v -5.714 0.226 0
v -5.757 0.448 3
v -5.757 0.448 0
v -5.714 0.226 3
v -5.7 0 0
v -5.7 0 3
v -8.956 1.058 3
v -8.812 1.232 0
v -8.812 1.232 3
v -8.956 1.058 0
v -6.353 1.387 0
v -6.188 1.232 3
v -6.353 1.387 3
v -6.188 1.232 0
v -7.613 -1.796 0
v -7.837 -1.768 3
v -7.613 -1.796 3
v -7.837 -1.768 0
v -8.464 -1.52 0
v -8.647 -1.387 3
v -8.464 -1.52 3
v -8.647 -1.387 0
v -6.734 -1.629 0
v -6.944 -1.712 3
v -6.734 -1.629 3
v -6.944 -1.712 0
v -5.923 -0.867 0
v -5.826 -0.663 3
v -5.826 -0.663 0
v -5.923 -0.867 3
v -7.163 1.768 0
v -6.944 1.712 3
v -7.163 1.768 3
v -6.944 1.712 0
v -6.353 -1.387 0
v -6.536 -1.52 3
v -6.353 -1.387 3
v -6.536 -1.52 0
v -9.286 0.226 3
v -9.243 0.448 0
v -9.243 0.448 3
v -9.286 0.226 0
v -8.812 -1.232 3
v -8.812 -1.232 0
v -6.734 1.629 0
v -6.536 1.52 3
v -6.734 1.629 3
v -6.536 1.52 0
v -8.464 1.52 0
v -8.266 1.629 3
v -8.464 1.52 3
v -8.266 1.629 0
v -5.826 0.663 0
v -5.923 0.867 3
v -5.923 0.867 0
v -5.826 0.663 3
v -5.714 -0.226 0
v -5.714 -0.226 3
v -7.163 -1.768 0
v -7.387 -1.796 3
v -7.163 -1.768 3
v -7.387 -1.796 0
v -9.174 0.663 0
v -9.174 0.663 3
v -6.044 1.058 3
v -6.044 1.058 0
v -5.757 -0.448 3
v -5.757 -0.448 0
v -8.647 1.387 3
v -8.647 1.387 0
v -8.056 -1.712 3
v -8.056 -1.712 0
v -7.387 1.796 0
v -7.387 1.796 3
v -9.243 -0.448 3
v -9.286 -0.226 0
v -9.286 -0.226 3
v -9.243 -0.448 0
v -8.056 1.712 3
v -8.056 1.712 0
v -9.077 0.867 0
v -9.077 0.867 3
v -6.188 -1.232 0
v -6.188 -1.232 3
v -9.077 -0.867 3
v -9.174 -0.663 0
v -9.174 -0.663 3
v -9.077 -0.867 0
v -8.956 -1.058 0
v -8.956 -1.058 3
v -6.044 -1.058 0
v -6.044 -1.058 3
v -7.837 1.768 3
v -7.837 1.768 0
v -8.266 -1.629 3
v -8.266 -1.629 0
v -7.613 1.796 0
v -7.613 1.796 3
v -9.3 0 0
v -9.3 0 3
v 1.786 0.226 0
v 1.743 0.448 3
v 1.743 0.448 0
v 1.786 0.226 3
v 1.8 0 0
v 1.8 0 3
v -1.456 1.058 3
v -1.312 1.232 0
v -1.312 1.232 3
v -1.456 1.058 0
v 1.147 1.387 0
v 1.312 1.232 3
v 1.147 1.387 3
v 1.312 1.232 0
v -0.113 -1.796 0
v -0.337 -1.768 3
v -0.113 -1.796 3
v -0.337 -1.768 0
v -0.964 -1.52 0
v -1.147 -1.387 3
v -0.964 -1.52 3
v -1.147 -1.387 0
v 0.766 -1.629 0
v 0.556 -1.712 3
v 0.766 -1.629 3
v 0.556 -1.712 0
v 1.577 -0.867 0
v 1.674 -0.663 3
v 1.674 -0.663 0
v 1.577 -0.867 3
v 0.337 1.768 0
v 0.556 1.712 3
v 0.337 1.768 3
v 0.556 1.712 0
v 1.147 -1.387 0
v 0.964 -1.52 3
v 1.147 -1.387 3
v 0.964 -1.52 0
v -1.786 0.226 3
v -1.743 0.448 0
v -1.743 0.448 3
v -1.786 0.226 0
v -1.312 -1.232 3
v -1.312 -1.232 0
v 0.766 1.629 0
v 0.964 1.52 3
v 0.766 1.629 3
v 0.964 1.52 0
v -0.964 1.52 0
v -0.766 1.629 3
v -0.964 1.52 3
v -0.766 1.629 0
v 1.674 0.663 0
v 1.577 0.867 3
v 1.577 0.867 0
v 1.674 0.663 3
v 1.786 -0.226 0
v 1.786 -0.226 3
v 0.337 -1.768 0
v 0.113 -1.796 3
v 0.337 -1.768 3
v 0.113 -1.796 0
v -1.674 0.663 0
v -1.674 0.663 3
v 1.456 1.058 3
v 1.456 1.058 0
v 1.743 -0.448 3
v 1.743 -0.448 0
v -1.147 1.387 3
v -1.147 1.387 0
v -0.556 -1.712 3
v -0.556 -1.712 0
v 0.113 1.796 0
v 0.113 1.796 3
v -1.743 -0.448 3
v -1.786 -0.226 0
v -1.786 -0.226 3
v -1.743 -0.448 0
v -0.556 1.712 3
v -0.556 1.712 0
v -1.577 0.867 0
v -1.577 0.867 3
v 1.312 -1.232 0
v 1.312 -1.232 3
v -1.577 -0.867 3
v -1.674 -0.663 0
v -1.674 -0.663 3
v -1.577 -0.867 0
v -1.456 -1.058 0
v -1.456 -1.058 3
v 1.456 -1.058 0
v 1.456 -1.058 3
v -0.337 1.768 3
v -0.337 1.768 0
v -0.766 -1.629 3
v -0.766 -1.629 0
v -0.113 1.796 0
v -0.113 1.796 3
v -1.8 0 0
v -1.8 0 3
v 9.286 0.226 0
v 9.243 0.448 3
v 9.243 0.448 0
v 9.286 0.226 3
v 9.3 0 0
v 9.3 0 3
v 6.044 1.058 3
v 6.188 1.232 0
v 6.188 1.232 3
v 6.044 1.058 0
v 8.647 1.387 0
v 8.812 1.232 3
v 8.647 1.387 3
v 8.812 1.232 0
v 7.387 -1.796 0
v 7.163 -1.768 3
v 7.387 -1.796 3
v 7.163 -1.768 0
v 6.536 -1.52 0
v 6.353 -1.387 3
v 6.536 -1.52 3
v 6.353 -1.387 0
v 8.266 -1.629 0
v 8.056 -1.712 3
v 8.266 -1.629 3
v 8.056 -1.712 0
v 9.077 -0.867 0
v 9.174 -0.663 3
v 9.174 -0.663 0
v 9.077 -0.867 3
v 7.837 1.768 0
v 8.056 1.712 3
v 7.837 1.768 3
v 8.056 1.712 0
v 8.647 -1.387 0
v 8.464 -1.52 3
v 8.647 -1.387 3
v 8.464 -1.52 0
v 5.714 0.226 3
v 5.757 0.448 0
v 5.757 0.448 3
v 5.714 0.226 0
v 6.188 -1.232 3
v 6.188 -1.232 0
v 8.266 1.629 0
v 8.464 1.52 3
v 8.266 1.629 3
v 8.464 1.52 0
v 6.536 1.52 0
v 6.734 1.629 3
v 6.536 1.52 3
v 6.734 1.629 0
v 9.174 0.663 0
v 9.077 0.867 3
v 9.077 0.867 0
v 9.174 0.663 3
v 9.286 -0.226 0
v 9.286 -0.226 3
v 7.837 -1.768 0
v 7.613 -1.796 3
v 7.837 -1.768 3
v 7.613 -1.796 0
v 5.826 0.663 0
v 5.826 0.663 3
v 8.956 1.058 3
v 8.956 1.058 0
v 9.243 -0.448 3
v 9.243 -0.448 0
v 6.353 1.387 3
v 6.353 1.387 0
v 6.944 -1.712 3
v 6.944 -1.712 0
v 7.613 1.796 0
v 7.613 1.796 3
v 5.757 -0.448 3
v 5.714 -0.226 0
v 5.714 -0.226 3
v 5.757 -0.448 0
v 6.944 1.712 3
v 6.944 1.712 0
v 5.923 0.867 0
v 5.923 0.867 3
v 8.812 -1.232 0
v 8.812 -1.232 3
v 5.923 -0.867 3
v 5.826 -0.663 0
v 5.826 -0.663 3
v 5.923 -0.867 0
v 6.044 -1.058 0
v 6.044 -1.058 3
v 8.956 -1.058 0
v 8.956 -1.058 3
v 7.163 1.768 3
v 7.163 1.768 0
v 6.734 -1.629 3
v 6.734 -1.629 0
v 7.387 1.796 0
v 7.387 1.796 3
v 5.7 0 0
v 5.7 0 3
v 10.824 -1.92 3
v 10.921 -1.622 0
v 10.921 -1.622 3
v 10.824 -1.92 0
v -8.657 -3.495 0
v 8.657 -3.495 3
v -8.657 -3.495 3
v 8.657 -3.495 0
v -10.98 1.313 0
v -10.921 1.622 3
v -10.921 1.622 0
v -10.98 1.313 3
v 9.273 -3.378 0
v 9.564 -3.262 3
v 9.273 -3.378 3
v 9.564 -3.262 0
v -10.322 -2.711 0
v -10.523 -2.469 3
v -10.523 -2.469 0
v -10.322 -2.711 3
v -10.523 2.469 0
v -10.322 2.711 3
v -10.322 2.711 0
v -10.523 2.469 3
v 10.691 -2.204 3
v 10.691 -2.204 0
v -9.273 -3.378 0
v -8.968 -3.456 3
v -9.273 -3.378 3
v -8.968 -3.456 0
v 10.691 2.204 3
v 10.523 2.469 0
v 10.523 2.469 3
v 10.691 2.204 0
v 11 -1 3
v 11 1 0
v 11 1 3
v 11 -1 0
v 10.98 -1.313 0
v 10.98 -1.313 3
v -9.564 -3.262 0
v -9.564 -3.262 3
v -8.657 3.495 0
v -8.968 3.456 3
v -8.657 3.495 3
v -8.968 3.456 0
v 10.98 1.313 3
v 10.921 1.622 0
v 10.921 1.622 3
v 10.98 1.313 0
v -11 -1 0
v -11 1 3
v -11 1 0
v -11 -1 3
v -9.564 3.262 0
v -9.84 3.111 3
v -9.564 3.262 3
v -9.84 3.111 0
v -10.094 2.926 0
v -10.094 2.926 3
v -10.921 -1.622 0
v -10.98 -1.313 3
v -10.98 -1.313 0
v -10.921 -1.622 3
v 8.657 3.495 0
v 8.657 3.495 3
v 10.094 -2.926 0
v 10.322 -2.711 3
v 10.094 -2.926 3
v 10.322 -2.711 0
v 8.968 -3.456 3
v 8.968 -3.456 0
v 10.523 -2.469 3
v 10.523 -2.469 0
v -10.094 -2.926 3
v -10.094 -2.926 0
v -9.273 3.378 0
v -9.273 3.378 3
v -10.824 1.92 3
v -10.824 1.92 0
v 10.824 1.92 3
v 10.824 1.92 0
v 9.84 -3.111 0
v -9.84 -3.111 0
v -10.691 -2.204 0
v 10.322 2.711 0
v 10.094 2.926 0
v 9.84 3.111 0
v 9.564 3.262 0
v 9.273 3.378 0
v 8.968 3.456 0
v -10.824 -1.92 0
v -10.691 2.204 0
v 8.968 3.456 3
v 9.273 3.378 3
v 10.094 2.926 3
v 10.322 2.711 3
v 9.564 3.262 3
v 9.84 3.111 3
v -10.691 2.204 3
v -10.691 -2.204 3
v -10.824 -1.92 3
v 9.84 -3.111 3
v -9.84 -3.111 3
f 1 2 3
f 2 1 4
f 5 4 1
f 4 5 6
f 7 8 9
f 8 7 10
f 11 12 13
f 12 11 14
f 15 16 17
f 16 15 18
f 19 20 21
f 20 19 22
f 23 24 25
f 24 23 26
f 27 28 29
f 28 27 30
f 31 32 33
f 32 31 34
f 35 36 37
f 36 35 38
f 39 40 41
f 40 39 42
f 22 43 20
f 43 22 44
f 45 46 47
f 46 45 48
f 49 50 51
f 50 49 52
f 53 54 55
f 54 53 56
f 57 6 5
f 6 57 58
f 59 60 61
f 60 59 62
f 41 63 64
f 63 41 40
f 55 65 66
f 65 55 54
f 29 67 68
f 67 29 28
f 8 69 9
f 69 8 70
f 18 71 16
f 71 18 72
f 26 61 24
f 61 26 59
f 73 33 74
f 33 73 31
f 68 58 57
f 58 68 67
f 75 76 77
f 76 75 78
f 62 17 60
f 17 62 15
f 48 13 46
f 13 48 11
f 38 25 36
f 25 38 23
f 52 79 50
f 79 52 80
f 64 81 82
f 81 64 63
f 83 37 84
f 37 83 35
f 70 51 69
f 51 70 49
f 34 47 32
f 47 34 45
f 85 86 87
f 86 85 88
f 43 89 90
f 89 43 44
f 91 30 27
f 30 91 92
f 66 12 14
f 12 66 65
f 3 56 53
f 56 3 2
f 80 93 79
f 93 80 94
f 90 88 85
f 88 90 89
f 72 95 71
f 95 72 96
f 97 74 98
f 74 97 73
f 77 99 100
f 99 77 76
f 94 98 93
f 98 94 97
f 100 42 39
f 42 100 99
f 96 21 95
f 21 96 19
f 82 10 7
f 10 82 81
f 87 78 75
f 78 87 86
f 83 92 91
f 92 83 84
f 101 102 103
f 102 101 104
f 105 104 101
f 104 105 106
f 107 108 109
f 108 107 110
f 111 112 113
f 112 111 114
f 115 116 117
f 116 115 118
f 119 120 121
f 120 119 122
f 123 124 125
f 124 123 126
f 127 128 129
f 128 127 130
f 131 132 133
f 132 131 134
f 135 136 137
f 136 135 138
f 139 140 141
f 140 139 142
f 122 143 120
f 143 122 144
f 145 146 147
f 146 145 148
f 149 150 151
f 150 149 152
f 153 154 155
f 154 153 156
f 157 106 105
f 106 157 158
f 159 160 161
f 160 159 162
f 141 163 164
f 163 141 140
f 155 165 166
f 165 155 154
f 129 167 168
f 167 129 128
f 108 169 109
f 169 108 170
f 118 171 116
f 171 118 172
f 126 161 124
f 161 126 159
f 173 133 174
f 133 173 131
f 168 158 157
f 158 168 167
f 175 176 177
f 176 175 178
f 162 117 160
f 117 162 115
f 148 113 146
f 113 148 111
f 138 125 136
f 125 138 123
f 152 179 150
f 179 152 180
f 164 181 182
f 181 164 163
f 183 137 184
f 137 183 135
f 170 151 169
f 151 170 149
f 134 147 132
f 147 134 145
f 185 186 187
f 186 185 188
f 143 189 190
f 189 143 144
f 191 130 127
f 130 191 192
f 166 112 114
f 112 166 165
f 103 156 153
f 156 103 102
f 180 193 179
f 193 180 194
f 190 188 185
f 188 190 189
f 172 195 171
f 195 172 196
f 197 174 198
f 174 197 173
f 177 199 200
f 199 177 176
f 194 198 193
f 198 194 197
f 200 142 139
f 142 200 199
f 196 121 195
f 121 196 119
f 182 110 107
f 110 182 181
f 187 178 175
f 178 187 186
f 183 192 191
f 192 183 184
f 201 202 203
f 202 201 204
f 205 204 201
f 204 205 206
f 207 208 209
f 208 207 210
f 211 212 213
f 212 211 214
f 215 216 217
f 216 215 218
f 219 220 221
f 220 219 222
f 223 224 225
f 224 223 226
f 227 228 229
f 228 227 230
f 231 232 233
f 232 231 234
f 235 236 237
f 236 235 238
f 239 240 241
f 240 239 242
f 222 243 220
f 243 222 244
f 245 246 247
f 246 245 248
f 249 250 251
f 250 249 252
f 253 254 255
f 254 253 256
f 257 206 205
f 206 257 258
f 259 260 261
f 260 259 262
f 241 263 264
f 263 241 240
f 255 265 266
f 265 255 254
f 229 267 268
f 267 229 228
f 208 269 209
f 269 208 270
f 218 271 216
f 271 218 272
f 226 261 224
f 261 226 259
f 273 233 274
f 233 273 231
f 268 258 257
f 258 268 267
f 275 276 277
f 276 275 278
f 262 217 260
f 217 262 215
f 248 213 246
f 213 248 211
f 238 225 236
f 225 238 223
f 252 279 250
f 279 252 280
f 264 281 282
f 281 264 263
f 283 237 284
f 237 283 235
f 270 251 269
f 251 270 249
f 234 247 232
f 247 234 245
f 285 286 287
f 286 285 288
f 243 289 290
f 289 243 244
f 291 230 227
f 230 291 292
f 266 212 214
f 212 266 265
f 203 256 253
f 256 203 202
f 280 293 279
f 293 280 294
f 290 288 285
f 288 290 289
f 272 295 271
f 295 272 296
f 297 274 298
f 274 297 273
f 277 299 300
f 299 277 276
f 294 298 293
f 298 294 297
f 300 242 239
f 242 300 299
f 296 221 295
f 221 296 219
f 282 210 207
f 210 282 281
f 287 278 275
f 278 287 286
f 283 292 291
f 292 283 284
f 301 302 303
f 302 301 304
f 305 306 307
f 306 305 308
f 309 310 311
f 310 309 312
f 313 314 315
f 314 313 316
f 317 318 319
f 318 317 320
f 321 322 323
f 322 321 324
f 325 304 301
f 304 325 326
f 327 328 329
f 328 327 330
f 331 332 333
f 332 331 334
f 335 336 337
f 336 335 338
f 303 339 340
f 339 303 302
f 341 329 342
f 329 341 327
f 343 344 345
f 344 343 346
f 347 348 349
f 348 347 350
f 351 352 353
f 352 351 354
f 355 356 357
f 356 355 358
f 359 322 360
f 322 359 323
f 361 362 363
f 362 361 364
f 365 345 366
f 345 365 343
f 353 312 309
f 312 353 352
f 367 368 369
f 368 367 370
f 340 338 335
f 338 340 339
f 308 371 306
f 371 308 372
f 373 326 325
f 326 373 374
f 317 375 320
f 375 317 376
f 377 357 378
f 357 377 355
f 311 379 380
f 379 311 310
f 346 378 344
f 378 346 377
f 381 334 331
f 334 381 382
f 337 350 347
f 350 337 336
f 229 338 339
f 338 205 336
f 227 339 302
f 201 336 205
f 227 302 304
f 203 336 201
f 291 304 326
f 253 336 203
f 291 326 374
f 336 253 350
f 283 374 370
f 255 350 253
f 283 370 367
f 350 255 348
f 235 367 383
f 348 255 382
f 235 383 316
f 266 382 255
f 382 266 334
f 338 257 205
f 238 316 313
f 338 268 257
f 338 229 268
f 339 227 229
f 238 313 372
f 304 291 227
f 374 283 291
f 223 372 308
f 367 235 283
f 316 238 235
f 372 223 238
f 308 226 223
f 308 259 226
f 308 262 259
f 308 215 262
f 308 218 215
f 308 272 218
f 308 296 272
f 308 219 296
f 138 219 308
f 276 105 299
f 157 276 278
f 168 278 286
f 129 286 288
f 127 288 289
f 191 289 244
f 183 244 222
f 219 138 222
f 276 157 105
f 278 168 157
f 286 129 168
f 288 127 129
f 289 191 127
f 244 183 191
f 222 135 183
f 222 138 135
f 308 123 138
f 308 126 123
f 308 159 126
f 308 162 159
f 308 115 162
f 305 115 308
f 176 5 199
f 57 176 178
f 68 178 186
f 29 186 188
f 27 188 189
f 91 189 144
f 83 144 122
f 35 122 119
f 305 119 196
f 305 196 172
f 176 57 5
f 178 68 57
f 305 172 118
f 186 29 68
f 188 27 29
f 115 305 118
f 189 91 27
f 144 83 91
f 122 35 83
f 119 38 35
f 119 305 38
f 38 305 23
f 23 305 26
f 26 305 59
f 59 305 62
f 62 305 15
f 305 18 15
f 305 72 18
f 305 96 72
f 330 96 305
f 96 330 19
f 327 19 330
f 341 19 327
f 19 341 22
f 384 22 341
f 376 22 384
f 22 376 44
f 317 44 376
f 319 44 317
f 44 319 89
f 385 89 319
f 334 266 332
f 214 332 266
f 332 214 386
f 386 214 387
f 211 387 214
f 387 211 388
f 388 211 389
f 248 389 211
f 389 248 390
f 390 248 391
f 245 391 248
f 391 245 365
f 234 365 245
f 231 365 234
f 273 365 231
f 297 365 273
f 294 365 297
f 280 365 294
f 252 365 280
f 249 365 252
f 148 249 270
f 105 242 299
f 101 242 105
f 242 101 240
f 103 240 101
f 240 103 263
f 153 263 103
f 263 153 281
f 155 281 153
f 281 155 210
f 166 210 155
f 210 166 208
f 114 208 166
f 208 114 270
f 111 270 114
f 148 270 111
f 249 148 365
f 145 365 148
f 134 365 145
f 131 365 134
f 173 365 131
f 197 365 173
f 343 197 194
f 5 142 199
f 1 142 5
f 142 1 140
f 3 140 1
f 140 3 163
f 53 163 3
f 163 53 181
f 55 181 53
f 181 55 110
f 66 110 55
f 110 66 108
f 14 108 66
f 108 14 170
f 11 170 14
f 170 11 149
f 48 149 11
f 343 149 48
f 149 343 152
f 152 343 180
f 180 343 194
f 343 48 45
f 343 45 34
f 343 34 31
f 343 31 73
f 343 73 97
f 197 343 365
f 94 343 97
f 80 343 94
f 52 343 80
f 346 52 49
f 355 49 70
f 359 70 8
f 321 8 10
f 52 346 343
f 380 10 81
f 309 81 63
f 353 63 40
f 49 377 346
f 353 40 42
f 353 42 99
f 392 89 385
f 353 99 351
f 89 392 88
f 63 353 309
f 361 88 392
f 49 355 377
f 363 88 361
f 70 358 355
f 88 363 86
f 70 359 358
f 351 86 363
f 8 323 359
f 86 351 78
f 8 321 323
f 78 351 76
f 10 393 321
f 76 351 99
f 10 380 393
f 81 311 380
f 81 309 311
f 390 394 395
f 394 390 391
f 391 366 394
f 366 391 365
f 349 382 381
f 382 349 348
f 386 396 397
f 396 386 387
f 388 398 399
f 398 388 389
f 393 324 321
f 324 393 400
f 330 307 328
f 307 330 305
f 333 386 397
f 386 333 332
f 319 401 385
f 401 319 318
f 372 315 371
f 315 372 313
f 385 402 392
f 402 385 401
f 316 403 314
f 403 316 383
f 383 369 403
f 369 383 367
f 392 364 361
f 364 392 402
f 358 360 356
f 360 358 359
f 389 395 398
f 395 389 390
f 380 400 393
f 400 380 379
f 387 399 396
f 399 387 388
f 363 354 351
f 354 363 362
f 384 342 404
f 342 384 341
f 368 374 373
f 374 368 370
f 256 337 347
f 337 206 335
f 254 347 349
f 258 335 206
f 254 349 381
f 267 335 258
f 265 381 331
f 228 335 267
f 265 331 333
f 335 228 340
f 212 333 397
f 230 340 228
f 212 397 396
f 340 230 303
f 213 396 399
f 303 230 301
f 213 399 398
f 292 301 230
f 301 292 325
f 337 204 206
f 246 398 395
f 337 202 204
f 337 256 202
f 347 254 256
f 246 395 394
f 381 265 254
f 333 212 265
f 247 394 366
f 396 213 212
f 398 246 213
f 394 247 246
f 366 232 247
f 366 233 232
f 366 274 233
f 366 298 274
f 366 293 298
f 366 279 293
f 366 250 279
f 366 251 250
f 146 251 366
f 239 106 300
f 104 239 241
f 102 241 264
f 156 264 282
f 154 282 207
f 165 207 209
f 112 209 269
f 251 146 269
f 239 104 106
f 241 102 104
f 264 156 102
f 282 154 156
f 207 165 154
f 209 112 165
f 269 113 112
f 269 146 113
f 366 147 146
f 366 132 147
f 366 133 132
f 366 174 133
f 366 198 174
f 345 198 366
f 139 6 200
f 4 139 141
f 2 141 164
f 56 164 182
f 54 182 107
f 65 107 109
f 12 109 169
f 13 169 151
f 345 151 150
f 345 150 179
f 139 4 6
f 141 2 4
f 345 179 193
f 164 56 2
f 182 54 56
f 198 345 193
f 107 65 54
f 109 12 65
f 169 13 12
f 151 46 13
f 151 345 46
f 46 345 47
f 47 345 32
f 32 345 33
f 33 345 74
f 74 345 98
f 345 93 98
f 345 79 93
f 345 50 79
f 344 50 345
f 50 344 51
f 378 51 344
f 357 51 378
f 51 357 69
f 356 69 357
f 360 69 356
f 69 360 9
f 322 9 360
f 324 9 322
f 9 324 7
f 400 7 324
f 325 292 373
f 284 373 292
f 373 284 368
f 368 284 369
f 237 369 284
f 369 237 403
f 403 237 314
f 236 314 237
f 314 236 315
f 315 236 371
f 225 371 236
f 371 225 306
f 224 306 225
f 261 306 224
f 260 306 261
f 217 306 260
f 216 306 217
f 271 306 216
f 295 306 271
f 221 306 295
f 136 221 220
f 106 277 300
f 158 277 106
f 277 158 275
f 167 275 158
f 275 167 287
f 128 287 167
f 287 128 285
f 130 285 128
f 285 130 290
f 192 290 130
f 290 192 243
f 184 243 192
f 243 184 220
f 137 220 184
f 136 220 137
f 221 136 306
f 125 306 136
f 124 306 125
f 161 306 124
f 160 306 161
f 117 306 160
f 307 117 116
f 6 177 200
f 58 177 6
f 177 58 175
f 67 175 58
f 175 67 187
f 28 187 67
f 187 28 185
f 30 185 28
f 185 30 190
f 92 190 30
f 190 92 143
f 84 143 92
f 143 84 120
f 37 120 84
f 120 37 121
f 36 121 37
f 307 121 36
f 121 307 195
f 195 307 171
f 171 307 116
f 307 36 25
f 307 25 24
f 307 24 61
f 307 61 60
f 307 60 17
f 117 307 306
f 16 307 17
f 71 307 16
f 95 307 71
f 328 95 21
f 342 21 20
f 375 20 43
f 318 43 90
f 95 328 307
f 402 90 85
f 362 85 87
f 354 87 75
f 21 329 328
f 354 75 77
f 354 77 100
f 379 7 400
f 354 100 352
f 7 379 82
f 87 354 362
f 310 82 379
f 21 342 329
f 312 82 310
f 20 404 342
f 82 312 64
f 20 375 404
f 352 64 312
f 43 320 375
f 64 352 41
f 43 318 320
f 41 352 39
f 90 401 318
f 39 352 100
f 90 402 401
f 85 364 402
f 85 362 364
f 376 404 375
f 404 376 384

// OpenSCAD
$fn = 50;


difference() {
	union() {
		translate(v = [0, 0, 0]) {
			rotate(a = [0, 0, 0]) {
				hull() {
					translate(v = [-8.5000000000, 1.0000000000, 0]) {
						rotate(a = [0, 0, 0]) {
							translate(v = [0, 0, 0]) {
								rotate(a = [0, 0, 0]) {
									cylinder(h = 3, r = 2.5000000000);
								}
							}
						}
					}
					translate(v = [8.5000000000, 1.0000000000, 0]) {
						rotate(a = [0, 0, 0]) {
							translate(v = [0, 0, 0]) {
								rotate(a = [0, 0, 0]) {
									cylinder(h = 3, r = 2.5000000000);
								}
							}
						}
					}
					translate(v = [-8.5000000000, -1.0000000000, 0]) {
						rotate(a = [0, 0, 0]) {
							translate(v = [0, 0, 0]) {
								rotate(a = [0, 0, 0]) {
									cylinder(h = 3, r = 2.5000000000);
								}
							}
						}
					}
					translate(v = [8.5000000000, -1.0000000000, 0]) {
						rotate(a = [0, 0, 0]) {
							translate(v = [0, 0, 0]) {
								rotate(a = [0, 0, 0]) {
									cylinder(h = 3, r = 2.5000000000);
								}
							}
						}
					}
				}
			}
		}
	}
	union() {
		translate(v = [-7.5000000000, 0.0000000000, 0]) {
			rotate(a = [0, 0, 0]) {
				translate(v = [0, 0, -50]) {
					rotate(a = [0, 0, 0]) {
						cylinder(h = 100, r = 1.8000000000);
					}
				}
			}
		}
		translate(v = [0.0000000000, 0.0000000000, 0]) {
			rotate(a = [0, 0, 0]) {
				translate(v = [0, 0, -50]) {
					rotate(a = [0, 0, 0]) {
						cylinder(h = 100, r = 1.8000000000);
					}
				}
			}
		}
		translate(v = [7.5000000000, 0.0000000000, 0]) {
			rotate(a = [0, 0, 0]) {
				translate(v = [0, 0, -50]) {
					rotate(a = [0, 0, 0]) {
						cylinder(h = 100, r = 1.8000000000);
					}
				}
			}
		}
	}
}
